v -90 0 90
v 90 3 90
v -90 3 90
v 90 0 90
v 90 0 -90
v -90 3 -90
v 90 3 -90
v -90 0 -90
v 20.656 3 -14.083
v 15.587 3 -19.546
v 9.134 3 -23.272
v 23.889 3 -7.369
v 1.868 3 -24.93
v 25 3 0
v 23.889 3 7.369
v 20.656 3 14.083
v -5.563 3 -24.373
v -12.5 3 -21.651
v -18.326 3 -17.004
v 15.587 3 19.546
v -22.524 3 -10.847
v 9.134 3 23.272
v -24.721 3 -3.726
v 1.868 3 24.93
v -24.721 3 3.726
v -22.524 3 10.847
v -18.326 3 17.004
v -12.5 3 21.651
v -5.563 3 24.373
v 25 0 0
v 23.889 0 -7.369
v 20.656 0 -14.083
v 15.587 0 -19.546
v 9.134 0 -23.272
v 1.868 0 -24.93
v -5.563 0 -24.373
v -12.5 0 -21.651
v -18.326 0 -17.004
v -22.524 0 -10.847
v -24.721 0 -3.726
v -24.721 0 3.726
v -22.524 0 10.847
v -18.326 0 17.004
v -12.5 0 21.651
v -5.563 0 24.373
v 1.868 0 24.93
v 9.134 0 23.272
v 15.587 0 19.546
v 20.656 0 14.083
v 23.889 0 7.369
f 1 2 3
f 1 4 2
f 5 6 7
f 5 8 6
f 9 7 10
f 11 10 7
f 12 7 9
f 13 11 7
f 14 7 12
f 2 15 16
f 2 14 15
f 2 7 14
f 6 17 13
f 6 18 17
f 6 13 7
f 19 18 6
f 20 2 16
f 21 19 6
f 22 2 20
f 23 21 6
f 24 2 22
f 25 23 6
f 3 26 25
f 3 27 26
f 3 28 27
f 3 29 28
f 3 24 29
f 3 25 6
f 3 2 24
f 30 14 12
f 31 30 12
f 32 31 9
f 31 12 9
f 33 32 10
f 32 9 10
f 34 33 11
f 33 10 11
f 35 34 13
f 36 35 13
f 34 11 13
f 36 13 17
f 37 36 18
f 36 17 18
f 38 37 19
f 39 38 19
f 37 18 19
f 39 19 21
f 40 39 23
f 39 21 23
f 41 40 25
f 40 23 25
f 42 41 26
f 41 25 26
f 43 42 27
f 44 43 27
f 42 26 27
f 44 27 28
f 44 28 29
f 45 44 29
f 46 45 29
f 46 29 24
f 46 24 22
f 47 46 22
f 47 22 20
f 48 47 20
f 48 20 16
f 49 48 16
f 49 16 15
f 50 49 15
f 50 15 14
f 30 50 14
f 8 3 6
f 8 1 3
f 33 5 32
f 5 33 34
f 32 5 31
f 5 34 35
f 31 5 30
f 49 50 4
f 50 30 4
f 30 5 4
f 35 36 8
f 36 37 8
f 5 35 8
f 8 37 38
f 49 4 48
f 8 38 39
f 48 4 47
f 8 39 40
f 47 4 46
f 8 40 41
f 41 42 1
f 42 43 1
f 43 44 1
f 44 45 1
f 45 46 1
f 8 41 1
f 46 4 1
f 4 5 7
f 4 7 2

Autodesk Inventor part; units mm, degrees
ref_plane "YZ Plane" through (0, 0, 0) normal (1, 0, 0) x (0, 1, 0)
ref_plane "XZ Plane" through (0, 0, 0) normal (0, 1, 0) x (-1, 0, 0)
ref_plane "XY Plane" through (0, 0, 0) normal (0, 0, 1) x (1, 0, 0)
sketch "Sketch1" plane through (0, 0, 0) normal (0, 1, 0) x (-1, 0, 0)
  line L0 (-87, 87) -> (87, 87) construction
  line L1 (87, 87) -> (87, -87) construction
  line L2 (87, -87) -> (-87, -87) construction
  line L3 (-87, -87) -> (-87, 87) construction
  line L4 (-87, 87) -> (87, -87) construction
  line L5 (87, 87) -> (-87, -87) construction
  line L6 (-90, 90) -> (90, 90)
  line L7 (90, 90) -> (90, -90)
  line L8 (90, -90) -> (-90, -90)
  line L9 (-90, -90) -> (-90, 90)
  line L10 (-90, 90) -> (90, -90) construction
  line L11 (90, 90) -> (-90, -90) construction
  point P0 (0, 0)
  dimension "d0" = 174
  dimension "d1" = 174
  dimension "d2" = 3
extrude "Extrusion1" add sketch "Sketch1" along normal blind 3
sketch "Sketch2" plane through (0, 3, 0) normal (0, 1, 0) x (1, 0, 0)
  circle A0 centre (0, 0) radius 25
  dimension "d5" = 50
extrude "Extrusion2" cut sketch "Sketch2" against normal through all
properties part number "Tapa"
